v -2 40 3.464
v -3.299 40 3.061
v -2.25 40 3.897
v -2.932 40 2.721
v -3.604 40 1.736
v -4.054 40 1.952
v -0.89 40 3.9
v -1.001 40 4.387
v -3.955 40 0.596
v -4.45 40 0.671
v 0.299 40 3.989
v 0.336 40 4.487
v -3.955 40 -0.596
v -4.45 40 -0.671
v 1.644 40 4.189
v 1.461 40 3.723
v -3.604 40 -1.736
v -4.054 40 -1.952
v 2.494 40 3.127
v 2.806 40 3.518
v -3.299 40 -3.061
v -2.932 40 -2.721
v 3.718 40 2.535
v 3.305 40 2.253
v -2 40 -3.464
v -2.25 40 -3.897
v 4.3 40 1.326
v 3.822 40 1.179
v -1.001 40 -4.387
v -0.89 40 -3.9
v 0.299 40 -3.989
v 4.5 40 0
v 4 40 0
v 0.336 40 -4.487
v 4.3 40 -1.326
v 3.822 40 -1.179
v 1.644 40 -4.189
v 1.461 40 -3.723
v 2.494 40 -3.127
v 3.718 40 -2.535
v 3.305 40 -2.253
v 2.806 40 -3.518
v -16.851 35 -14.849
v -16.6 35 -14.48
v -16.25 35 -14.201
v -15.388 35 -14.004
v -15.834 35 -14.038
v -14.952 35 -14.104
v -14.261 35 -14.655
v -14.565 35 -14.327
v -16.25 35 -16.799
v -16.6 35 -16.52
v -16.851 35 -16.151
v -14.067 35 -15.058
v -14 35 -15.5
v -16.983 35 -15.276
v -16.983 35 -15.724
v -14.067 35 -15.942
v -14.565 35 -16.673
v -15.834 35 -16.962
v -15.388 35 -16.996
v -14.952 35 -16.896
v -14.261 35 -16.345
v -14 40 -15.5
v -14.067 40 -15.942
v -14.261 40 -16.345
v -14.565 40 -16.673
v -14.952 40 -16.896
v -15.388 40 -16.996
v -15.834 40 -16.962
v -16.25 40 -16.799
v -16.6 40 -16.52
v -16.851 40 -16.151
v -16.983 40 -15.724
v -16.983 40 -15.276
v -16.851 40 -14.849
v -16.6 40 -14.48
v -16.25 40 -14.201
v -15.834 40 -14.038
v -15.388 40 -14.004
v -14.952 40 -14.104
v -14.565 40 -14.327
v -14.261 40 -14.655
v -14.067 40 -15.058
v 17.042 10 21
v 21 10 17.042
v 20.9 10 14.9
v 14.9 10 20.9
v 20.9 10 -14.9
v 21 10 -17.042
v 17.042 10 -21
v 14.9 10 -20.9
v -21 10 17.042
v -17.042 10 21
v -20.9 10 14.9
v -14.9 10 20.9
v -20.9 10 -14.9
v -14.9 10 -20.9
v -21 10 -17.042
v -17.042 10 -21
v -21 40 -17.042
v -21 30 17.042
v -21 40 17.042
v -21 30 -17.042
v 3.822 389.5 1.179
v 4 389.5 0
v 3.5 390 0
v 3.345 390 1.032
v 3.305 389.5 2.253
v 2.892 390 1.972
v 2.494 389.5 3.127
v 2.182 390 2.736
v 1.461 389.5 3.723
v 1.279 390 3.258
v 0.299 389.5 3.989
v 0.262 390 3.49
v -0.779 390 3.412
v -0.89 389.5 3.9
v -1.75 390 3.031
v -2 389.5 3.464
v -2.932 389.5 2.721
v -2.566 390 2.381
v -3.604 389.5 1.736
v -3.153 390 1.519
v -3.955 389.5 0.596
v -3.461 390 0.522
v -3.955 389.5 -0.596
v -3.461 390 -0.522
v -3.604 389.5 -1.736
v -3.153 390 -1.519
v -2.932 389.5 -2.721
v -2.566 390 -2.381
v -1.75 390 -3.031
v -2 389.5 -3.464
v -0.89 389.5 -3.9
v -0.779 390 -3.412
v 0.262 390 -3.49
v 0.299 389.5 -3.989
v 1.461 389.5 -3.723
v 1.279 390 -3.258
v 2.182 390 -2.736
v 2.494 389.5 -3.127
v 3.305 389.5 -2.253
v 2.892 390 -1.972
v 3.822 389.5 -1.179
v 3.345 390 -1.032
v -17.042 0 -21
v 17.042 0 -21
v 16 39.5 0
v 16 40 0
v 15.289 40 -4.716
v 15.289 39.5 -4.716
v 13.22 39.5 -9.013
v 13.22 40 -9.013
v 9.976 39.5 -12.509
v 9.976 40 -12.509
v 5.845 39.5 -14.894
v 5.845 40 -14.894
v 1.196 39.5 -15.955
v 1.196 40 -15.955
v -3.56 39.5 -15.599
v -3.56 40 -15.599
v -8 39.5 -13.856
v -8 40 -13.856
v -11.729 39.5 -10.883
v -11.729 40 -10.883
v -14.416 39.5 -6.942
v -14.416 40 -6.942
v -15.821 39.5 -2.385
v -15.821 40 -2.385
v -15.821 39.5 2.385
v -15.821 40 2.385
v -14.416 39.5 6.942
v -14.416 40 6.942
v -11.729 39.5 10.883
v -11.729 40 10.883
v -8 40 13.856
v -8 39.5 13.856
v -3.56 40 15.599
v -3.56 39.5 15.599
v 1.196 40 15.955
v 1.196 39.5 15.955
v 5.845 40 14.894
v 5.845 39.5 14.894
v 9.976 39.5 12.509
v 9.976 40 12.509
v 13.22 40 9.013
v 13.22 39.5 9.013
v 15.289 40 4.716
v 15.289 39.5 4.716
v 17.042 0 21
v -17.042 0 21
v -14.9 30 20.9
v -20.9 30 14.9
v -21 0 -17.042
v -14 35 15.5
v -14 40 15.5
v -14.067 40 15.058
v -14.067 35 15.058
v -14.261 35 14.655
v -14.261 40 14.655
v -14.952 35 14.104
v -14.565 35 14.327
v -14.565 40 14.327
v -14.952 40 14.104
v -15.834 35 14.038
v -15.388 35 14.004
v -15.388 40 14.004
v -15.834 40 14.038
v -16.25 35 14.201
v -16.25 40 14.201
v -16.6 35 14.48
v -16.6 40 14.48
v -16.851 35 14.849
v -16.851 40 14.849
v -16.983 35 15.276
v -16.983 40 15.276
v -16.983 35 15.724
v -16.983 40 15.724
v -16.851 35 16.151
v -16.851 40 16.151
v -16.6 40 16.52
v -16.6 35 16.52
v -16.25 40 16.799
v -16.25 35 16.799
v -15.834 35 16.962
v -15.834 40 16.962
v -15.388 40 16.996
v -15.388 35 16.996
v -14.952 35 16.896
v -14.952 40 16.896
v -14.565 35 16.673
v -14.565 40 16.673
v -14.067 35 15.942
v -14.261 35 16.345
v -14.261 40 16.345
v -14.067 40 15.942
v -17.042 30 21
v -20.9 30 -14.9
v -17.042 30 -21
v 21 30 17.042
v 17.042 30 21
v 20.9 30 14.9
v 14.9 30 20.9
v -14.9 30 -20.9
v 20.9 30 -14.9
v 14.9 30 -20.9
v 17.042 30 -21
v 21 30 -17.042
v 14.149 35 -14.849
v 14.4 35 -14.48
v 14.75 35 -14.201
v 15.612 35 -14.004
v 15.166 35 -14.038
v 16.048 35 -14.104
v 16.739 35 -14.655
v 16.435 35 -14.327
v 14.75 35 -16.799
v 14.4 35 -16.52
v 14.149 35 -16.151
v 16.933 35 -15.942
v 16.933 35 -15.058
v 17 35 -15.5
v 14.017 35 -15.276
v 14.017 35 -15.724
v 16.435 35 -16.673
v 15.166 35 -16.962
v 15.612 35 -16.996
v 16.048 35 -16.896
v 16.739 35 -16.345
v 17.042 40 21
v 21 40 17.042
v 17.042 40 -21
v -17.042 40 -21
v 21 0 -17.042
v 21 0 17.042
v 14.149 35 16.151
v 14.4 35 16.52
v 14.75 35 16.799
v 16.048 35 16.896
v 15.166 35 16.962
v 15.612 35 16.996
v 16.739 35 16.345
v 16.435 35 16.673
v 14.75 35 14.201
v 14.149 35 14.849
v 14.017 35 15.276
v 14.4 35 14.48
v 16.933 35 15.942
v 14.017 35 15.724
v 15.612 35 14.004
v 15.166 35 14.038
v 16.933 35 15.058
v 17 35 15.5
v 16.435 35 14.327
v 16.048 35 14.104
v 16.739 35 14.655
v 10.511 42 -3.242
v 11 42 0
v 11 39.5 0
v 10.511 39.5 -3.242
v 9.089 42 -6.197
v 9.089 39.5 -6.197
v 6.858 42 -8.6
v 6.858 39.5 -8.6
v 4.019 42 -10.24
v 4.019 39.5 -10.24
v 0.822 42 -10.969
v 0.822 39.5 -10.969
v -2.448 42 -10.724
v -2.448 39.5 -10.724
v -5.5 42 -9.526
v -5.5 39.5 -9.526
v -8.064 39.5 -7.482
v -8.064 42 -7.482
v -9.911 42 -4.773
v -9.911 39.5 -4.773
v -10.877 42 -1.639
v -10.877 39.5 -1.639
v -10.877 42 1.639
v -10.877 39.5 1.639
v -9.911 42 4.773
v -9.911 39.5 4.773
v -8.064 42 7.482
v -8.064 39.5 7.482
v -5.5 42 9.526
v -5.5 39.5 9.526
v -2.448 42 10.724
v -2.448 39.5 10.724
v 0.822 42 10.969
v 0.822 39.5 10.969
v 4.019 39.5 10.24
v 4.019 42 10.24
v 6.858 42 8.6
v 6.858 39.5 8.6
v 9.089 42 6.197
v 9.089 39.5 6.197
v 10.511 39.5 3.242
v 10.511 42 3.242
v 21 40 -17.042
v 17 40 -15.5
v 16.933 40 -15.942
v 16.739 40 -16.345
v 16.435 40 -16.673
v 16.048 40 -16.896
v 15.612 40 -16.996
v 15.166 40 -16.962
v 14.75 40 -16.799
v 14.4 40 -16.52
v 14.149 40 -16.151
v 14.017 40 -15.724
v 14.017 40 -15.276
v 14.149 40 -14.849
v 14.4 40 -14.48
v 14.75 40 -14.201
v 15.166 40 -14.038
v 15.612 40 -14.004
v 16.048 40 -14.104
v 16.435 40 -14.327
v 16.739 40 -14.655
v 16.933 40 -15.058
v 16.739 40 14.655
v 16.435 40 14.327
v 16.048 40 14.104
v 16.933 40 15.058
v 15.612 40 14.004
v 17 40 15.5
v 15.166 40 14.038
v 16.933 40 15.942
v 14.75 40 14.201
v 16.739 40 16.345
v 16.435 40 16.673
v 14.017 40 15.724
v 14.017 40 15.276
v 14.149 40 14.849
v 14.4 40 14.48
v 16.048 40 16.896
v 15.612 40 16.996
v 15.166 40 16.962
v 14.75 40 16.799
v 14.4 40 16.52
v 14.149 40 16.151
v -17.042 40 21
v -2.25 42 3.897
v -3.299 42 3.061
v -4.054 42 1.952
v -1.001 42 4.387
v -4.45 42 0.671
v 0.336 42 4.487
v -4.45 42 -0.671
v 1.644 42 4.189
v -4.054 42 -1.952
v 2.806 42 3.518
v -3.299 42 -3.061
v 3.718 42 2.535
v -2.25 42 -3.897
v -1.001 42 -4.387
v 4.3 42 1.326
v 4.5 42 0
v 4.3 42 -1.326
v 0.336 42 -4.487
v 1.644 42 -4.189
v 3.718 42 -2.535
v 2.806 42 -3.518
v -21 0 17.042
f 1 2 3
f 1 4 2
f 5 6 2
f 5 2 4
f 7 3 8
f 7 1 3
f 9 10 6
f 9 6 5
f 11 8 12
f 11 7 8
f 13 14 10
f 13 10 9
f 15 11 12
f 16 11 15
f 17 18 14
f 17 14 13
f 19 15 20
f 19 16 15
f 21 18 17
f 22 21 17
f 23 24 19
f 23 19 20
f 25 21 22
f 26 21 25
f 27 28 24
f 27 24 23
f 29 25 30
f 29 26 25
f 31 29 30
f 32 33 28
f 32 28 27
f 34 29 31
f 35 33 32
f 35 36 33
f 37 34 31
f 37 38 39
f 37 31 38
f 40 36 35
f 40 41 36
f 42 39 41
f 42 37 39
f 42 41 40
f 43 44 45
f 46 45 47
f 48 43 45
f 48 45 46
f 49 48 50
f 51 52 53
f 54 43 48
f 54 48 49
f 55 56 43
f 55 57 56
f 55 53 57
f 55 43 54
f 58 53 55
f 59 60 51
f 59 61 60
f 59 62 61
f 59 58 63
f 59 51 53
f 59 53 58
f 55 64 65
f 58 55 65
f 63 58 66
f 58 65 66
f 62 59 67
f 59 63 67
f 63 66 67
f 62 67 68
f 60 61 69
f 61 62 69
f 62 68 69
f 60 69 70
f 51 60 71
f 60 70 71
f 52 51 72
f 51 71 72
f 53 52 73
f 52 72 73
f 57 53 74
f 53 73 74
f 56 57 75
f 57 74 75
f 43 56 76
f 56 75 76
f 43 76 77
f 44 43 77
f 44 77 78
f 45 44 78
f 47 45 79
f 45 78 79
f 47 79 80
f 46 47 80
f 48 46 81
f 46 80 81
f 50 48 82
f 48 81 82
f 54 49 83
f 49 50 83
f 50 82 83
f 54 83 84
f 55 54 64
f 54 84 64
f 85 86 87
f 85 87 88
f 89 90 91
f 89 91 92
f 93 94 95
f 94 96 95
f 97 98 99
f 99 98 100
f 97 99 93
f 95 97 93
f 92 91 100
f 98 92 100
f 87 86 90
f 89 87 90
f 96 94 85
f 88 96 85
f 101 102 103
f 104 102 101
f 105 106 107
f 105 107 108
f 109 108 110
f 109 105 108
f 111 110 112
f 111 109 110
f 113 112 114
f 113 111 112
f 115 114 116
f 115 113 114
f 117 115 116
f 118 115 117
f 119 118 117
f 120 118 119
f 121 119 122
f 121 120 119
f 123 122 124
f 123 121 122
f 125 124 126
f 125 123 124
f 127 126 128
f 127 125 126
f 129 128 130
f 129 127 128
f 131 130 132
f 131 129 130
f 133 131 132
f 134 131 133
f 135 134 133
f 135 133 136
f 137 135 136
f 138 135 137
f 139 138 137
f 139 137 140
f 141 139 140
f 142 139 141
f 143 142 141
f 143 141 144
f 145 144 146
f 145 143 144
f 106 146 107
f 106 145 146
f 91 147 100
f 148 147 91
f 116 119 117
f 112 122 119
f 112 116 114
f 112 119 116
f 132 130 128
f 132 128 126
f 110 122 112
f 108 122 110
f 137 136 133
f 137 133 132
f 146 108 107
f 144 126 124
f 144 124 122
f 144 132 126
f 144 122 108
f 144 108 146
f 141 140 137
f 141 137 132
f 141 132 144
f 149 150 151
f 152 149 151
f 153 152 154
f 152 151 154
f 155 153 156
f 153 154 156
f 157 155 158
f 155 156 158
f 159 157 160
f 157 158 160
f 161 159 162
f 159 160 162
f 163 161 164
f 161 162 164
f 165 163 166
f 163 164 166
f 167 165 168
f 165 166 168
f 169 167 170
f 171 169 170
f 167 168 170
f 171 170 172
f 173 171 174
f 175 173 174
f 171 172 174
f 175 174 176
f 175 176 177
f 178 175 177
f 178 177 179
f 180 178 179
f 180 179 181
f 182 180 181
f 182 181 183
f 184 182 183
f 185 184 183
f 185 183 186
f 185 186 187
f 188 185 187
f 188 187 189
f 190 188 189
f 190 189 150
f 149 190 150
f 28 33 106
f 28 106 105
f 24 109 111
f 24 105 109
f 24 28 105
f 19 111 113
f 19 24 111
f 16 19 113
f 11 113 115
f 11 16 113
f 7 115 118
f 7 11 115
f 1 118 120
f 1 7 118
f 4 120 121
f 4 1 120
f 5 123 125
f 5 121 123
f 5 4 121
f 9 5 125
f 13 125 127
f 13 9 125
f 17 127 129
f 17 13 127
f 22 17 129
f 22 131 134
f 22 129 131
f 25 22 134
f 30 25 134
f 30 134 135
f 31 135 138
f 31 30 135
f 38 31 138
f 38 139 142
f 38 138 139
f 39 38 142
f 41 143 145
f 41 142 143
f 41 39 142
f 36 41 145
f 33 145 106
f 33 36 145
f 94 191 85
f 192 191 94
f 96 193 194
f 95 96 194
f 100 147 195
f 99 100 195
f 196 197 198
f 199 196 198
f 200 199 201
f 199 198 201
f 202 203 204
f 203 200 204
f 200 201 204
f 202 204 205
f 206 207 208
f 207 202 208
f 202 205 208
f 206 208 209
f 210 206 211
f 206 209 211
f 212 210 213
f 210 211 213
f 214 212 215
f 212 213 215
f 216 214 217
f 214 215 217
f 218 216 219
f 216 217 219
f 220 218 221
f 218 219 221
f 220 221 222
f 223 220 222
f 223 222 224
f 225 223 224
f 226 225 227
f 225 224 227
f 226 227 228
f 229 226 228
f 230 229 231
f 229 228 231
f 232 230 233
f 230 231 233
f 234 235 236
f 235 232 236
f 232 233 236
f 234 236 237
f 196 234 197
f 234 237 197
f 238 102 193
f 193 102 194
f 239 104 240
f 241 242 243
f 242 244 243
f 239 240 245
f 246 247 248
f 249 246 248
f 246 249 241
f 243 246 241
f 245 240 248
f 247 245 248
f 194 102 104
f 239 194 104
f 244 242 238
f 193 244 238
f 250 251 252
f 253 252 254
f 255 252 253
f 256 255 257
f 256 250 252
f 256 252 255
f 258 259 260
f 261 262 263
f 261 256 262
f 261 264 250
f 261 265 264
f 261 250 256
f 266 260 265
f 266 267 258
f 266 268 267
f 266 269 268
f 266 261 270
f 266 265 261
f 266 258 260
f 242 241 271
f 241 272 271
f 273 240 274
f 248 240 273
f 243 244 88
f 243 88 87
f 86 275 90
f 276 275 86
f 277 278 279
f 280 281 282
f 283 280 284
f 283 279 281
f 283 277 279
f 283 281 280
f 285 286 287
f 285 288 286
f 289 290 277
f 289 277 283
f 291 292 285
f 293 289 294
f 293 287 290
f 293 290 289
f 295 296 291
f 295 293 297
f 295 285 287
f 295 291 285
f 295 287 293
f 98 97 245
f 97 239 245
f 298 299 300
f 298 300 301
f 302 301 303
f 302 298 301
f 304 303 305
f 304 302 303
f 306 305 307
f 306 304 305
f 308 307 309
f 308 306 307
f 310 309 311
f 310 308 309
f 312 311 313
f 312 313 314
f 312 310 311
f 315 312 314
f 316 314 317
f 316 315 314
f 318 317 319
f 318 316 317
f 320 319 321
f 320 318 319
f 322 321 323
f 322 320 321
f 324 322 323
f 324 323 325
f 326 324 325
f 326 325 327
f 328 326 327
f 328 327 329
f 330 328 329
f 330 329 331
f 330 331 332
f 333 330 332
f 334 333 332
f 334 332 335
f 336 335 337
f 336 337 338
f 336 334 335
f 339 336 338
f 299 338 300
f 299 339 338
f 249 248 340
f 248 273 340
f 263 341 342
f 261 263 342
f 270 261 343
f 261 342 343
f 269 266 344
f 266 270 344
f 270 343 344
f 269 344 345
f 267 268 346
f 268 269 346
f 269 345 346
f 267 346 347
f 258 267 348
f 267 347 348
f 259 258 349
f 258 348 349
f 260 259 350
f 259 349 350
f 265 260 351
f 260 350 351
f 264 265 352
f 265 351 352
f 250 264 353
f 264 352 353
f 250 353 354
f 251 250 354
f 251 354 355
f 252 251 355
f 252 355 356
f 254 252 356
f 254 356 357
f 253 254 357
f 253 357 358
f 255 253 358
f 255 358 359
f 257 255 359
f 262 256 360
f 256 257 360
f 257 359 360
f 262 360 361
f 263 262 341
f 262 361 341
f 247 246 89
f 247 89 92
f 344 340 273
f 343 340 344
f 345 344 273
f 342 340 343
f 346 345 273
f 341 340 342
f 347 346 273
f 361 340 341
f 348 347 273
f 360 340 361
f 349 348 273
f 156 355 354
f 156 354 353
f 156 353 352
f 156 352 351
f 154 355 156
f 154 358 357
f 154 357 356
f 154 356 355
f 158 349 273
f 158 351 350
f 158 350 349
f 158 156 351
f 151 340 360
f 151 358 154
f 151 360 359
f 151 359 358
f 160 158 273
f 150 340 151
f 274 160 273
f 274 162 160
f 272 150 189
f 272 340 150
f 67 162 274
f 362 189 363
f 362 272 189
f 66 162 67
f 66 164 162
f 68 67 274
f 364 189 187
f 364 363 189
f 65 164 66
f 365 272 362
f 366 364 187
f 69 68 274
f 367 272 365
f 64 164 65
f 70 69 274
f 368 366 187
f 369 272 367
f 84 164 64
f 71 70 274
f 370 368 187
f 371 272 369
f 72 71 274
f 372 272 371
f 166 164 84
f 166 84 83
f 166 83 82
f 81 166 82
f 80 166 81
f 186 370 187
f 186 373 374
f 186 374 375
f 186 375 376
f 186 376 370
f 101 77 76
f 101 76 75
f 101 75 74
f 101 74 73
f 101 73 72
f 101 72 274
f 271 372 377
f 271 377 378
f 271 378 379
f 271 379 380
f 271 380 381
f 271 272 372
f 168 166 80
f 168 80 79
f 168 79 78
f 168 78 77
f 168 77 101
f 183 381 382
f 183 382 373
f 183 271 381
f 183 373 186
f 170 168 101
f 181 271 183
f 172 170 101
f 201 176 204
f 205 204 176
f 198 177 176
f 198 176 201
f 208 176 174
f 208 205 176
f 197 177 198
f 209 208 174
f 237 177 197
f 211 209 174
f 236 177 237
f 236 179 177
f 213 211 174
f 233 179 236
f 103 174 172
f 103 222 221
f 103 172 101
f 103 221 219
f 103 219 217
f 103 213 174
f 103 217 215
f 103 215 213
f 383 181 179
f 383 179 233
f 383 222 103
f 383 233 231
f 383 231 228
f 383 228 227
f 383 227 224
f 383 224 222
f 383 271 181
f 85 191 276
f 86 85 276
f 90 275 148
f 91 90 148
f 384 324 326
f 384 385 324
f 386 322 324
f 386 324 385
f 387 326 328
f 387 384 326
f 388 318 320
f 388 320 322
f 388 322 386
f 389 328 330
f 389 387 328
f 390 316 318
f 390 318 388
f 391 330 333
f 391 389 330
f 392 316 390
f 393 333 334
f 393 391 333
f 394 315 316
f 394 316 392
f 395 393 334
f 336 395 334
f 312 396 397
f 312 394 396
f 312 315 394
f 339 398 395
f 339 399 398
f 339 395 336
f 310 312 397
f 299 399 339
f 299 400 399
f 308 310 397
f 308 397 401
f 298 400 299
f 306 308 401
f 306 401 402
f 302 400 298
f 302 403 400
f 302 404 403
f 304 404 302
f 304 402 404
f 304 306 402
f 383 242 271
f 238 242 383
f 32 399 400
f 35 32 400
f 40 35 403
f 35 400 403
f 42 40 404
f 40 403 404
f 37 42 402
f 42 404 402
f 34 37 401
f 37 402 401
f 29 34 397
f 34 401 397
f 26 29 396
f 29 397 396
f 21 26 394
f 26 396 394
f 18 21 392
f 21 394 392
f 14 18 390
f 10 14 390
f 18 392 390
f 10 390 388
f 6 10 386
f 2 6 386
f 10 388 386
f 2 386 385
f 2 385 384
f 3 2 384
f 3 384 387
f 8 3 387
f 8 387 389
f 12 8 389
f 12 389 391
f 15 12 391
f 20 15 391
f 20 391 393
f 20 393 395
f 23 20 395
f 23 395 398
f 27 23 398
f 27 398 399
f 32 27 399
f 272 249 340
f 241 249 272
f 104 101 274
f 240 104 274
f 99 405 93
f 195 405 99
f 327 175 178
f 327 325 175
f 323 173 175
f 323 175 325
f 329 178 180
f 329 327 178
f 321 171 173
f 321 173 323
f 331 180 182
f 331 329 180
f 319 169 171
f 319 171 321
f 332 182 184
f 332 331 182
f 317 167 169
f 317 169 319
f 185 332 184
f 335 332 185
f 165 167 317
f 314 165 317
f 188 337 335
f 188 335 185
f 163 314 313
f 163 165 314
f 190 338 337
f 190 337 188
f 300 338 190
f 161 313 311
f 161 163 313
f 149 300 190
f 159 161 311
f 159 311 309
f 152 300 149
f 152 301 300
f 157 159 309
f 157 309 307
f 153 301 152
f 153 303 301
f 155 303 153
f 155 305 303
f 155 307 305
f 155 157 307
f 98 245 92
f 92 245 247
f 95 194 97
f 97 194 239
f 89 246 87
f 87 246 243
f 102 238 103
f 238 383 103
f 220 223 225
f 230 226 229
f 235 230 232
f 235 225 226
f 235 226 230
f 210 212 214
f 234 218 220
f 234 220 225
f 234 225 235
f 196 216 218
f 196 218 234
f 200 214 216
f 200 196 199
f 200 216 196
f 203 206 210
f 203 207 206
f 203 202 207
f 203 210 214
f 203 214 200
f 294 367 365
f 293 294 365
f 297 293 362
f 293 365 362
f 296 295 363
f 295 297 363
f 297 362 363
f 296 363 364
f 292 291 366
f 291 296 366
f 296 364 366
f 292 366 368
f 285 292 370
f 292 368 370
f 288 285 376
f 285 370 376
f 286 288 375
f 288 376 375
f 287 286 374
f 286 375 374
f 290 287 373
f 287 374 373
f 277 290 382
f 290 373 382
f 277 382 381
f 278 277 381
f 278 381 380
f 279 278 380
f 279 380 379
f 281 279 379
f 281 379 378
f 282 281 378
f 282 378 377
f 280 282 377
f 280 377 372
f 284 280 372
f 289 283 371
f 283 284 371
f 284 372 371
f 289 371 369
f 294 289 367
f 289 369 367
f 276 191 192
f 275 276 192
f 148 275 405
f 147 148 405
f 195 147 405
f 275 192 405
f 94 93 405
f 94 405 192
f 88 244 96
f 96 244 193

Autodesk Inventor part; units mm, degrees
ref_plane "YZ Plane" through (0, 0, 0) normal (1, 0, 0) x (0, 1, 0)
ref_plane "XZ Plane" through (0, 0, 0) normal (0, 1, 0) x (-1, 0, 0)
sketch "Sketch1" plane through (0, 0, 0) normal (0, 1, 0) x (-1, 0, 0)
  line L0 (-21, 21) -> (21, 21)
  line L1 (21, 21) -> (21, -21)
  line L2 (21, -21) -> (-21, -21)
  line L3 (-21, -21) -> (-21, 21)
  line L4 (-21, 21) -> (21, -21) construction
  line L5 (21, 21) -> (-21, -21) construction
  point P0 (0, 0)
  dimension "d0" = 42
  dimension "d1" = 42
extrude "Extrusion1" add sketch "Sketch1" along normal blind 40
ref_plane "Work Plane1" through (0, 20, 0) normal (0, 1, 0) x (1, 0, 0)
sketch "Sketch2" plane through (0, 40, 0) normal (0, 1, 0) x (1, 0, 0)
  line L0 (0, -38.0423) -> (-38.0423, 0)
  line L1 (-38.0423, 0) -> (0, 38.0423)
  line L2 (0, 38.0423) -> (38.0423, 0)
  line L3 (38.0423, 0) -> (0, -38.0423)
  line L4 (0, -38.0423) -> (0, 38.0423) construction
  line L5 (-38.0423, 0) -> (38.0423, 0) construction
  line L6 (-21, 21) -> (-21, -21) projected
  circle A0 centre (0, 0) radius 250
  dimension "d4" = 53.8
  dimension "d5" = 53.8
  dimension "d6" = 500
extrude "Extrusion2" cut sketch "Sketch2" against normal blind 10
sketch "Sketch3" plane through (0, 20, 0) normal (0, 1, 0) x (1, 0, 0)
  line L0 (-20.9, -20.9) -> (20.9, -20.9)
  line L1 (20.9, -20.9) -> (20.9, 20.9)
  line L2 (20.9, 20.9) -> (-20.9, 20.9)
  line L3 (-20.9, 20.9) -> (-20.9, -20.9)
  line L4 (-21, -21) -> (-21, -17.0423) projected
  line L5 (21, -21) -> (17.0423, -21) projected
  line L6 (21, 21) -> (21, 17.0423) projected
  line L7 (-21, 21) -> (-17.0423, 21) projected
  circle A0 centre (0, 0) radius 200
  dimension "d9" = 0.1
  dimension "d10" = 0.1
  dimension "d11" = 0.1
  dimension "d12" = 0.1
  dimension "d13" = 400
extrude "Extrusion3" cut sketch "Sketch3" along normal up to surface (10 mm away)
chamfer "Chamfer1" distance 6 angle 45 4 edges at (20.9, 25, 20.9) (20.9, 25, -20.9) (-20.9, 25, 20.9) (-20.9, 25, -20.9)
mirror "Mirror1" about plane through (0, 20, 0) normal (0, 1, 0) of "Extrusion3", "Extrusion2", "Chamfer1"
sketch "Sketch4" plane through (0, 40, 0) normal (0, 1, 0) x (1, 0, 0)
  circle A0 centre (0, 0) radius 11
  dimension "d19" = 22
extrude "Extrusion4" add sketch "Sketch4" along normal blind 2
sketch "Sketch5" plane through (0, 40, 0) normal (0, 1, 0) x (1, 0, 0)
  circle A0 centre (0, 0) radius 11 projected
  line L0 (17.0423, -21) -> (21, -17.0423) projected
  line L1 (21, -17.0423) -> (21, 17.0423) projected
  line L2 (21, 17.0423) -> (17.0423, 21) projected
  line L3 (17.0423, 21) -> (-17.0423, 21) projected
  line L4 (-17.0423, 21) -> (-21, 17.0423) projected
  line L5 (-21, 17.0423) -> (-21, -17.0423) projected
  line L6 (-21, -17.0423) -> (-17.0423, -21) projected
  line L7 (-17.0423, -21) -> (17.0423, -21) projected
  circle A1 centre (0, 0) radius 16
  dimension "d22" = 32
extrude "Extrusion5" cut sketch "Sketch5" against normal blind 0.5 contours A1
sketch "Sketch6" plane through (0, 42, 0) normal (0, 1, 0) x (1, 0, 0)
  circle A0 centre (0, 0) radius 4.5
  dimension "d25" = 9
extrude "Extrusion6" cut sketch "Sketch6" against normal blind 2
sketch "Sketch7" plane through (0, 40, 0) normal (0, 1, 0) x (1, 0, 0)
  circle A0 centre (0, 0) radius 4
  dimension "d28" = 8
extrude "Extrusion7" add sketch "Sketch7" along normal blind 350
thread "Thread1" size "TR8x1.5" class "7e" standard "ISO Metric Trapezoidal Threads" full length
chamfer "Chamfer2" distance 0.5 angle 45 1 edges at (-4, 390, 0)
sketch "Sketch8" plane through (0, 40, 0) normal (0, 1, 0) x (1, 0, 0)
  circle A0 centre (0, 0) radius 16 construction
  line L0 (17.0423, -21) -> (21, -17.0423) construction
  line L1 (21, -17.0423) -> (21, 17.0423) construction
  line L2 (21, 17.0423) -> (17.0423, 21) construction
  line L3 (17.0423, 21) -> (-17.0423, 21) construction
  line L4 (-17.0423, 21) -> (-21, 17.0423) construction
  line L5 (-21, 17.0423) -> (-21, -17.0423) construction
  line L6 (-21, -17.0423) -> (-17.0423, -21) construction
  line L7 (-17.0423, -21) -> (17.0423, -21) construction
  line L8 (-15.5, -15.5) -> (15.5, -15.5) construction
  line L9 (15.5, -15.5) -> (15.5, 15.5) construction
  line L10 (15.5, 15.5) -> (-15.5, 15.5) construction
  line L11 (-15.5, 15.5) -> (-15.5, -15.5) construction
  line L12 (-15.5, -15.5) -> (15.5, 15.5) construction
  line L13 (15.5, -15.5) -> (-15.5, 15.5) construction
  circle A1 centre (-15.5, 15.5) radius 1.5
  circle A2 centre (15.5, 15.5) radius 1.5
  circle A3 centre (15.5, -15.5) radius 1.5
  circle A4 centre (-15.5, -15.5) radius 1.5
  dimension "d36" = 31
  dimension "d37" = 31
  dimension "d38" = 3
  dimension "d39" = 3
  dimension "d40" = 3
  dimension "d41" = 3
extrude "Extrusion8" cut sketch "Sketch8" against normal blind 5
thread "Thread2" size "M3x0.5" class "6H" standard "ANSI Metric M Profile" full length
pattern_circular "Circular Pattern1" count 4 over 360 about axis through (0, 40, 0) along (0, 1, 0) of "Extrusion8"
equation "\"d9\" = d10"
equation "\"d11\" = d10"
equation "\"d12\" = d10"
properties part number "linear_stepper_350mm"
